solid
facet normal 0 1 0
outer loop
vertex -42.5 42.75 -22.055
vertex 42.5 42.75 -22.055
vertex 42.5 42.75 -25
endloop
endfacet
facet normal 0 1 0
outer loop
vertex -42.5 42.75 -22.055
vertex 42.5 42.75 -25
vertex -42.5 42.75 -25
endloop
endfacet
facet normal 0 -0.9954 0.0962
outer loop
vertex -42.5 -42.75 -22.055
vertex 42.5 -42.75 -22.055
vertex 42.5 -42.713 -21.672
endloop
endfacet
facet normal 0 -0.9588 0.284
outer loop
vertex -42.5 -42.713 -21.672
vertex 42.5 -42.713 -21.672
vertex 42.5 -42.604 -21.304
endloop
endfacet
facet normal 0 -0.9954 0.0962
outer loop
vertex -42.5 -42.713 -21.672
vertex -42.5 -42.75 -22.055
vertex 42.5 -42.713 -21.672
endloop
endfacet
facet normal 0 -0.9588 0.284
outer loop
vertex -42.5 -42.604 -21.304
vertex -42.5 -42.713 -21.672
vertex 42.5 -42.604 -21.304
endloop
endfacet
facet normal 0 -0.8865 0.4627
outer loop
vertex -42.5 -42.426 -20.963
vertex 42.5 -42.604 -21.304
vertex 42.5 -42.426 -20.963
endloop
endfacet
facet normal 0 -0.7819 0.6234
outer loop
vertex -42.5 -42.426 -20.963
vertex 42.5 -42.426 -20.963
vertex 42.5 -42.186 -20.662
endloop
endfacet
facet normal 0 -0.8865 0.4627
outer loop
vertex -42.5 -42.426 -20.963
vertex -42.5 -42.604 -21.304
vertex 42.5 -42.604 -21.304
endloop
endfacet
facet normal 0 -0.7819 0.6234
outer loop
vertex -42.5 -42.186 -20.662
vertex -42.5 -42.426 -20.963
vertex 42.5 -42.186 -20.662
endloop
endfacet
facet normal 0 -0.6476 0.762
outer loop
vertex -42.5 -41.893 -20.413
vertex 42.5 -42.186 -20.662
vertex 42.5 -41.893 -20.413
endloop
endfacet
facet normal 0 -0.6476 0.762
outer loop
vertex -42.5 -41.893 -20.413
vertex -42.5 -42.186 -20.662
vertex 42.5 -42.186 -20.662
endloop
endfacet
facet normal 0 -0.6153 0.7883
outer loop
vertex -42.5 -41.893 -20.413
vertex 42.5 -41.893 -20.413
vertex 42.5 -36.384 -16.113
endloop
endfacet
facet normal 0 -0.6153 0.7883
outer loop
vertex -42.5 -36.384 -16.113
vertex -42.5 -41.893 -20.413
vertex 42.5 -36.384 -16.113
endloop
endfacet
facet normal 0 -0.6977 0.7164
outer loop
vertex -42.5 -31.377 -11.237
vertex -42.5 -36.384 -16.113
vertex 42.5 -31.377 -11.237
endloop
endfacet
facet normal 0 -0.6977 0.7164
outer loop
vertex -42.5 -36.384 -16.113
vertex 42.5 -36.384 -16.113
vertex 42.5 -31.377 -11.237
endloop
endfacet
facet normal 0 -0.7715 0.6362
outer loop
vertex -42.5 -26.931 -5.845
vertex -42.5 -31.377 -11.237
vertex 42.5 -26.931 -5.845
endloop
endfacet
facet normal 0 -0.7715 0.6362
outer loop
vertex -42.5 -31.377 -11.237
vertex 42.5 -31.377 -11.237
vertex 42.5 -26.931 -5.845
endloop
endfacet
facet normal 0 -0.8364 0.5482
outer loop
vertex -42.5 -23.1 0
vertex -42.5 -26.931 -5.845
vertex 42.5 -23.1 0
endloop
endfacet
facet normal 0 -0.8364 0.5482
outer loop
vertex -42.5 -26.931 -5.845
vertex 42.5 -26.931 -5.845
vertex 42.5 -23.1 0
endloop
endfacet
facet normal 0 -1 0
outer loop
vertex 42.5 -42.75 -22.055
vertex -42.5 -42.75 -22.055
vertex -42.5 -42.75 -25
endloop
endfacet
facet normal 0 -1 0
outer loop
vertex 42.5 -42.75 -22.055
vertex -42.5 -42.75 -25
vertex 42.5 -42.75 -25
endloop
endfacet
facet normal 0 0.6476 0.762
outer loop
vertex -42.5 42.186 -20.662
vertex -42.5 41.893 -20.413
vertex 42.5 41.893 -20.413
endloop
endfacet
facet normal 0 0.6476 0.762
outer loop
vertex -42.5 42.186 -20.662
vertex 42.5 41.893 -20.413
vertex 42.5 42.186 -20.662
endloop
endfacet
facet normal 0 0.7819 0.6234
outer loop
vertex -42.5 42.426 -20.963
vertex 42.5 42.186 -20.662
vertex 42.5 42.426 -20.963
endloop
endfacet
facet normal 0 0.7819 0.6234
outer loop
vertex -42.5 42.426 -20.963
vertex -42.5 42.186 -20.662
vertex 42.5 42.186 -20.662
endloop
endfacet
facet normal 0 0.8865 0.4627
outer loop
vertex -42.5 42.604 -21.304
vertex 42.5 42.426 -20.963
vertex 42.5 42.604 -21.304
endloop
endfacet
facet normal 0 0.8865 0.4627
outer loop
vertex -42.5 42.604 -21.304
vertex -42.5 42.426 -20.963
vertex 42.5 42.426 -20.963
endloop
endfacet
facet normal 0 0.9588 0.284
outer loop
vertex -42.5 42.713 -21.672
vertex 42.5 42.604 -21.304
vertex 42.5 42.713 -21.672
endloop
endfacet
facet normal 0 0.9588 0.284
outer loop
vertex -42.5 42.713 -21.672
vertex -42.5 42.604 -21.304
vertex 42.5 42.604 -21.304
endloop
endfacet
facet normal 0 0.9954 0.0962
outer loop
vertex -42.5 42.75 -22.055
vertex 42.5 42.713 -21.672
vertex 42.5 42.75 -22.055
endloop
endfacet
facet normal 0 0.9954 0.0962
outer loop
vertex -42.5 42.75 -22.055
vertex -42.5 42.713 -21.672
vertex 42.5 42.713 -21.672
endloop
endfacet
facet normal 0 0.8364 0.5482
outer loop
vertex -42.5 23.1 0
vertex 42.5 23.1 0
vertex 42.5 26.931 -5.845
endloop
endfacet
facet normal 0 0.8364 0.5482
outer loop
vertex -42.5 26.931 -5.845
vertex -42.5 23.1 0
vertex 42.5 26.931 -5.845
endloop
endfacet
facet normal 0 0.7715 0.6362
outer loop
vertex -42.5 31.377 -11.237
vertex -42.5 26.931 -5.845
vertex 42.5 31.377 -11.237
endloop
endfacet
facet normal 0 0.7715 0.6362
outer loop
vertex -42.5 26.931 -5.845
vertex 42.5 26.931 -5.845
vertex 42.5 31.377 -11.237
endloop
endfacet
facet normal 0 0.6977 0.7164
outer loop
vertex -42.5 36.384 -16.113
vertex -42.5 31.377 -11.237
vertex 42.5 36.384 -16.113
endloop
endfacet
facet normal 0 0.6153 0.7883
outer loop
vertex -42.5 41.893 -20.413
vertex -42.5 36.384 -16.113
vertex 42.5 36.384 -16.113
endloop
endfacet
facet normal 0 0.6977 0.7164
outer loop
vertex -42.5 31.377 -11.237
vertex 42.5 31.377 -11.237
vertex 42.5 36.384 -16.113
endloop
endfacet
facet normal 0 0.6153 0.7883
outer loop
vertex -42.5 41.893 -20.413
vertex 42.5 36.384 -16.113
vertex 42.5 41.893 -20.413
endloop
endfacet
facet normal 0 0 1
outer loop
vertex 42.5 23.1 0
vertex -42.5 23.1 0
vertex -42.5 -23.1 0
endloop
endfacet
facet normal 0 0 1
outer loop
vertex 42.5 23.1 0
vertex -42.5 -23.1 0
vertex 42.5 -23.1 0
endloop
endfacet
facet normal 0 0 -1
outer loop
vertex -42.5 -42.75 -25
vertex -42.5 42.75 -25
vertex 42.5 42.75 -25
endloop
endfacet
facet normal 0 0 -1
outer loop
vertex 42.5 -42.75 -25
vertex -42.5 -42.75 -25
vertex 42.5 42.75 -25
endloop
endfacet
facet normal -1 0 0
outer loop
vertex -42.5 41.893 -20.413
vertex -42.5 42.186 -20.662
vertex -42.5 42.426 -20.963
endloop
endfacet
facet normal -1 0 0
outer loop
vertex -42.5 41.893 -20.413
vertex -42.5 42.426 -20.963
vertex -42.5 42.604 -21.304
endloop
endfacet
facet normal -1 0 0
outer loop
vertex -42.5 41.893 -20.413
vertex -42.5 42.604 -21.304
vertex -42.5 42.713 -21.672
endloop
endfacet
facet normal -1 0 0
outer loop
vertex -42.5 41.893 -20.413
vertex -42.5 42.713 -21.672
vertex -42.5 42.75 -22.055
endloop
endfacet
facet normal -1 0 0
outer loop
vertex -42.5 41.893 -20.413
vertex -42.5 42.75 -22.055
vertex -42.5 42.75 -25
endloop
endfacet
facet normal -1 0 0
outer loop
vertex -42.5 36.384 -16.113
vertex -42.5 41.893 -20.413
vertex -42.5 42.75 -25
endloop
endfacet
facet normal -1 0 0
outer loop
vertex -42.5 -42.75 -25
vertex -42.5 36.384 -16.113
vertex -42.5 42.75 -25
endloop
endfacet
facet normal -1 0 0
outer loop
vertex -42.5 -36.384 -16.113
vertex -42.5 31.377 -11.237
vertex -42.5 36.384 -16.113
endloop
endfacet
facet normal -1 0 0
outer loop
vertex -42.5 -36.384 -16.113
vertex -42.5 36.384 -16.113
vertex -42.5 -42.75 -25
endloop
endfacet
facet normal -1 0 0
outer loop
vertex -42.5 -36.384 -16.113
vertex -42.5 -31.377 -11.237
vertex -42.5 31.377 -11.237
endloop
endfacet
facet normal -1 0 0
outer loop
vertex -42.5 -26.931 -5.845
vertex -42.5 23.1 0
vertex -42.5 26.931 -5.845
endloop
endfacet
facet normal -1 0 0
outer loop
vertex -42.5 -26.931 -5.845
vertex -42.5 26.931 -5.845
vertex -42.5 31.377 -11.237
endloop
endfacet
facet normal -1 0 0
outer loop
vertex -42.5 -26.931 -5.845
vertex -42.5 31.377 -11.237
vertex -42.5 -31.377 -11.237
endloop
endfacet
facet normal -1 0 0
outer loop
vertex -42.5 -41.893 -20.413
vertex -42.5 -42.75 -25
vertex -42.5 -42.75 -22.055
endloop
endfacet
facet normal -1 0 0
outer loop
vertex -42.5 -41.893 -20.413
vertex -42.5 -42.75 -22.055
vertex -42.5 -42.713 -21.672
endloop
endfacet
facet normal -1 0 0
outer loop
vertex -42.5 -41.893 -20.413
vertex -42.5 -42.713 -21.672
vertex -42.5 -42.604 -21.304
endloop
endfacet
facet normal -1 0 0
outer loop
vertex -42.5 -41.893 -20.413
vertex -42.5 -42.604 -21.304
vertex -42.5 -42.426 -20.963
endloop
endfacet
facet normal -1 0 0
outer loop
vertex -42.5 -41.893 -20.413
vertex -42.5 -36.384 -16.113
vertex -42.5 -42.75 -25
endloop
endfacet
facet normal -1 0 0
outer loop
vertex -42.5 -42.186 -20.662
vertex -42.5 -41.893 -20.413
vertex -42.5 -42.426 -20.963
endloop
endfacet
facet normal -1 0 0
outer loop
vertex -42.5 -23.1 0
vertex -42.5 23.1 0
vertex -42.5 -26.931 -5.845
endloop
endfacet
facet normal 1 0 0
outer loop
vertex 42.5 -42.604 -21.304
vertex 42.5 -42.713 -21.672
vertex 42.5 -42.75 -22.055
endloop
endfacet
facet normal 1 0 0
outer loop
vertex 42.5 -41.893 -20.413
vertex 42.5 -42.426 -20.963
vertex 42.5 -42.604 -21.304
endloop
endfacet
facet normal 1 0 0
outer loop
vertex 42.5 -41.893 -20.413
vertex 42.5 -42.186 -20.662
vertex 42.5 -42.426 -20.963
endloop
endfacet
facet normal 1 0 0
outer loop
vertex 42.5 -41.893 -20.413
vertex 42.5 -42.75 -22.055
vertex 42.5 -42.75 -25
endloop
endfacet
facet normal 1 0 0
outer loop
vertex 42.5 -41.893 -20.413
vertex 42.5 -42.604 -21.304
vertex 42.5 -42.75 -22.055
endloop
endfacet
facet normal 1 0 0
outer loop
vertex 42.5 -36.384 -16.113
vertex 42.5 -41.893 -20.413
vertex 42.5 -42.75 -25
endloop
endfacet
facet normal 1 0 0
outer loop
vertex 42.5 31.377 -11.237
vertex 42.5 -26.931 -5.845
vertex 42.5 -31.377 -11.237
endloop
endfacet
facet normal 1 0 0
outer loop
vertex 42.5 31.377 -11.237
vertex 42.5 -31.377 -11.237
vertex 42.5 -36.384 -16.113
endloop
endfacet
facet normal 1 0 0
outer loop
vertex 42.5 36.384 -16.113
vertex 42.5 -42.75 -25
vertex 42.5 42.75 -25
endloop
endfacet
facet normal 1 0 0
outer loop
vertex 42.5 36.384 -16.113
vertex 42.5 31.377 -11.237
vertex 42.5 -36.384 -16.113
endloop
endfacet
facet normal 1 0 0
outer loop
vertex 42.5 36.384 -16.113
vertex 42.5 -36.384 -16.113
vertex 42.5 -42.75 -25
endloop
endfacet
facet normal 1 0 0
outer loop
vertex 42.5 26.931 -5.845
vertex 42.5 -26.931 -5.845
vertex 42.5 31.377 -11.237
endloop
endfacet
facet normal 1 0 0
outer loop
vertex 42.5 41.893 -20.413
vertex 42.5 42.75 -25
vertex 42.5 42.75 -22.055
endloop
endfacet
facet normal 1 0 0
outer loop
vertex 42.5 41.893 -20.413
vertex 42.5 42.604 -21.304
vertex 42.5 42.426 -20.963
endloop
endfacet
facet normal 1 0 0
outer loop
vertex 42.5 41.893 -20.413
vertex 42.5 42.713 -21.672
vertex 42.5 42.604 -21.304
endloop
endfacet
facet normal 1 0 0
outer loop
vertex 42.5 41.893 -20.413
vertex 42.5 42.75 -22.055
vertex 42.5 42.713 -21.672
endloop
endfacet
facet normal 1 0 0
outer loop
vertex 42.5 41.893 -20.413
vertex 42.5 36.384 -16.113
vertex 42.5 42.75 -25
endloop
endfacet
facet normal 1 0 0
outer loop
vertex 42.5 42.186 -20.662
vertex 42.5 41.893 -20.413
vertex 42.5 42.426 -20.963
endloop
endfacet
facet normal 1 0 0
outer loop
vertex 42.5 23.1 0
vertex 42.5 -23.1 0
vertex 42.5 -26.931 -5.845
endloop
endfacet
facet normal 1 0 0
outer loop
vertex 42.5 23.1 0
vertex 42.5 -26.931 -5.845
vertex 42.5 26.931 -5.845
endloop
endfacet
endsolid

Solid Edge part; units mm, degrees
sketch "Sketch1" plane through (0, 0, 0) normal (0, 0, 1) x (1, 0, 0)
  line L0 (-42.5, -42.75) -> (42.5, -42.75)
  line L1 (42.5, -42.75) -> (42.5, 42.75)
  line L2 (42.5, 42.75) -> (-42.5, 42.75)
  line L3 (-42.5, 42.75) -> (-42.5, -42.75)
extrude "Protrusion1" add sketch "Sketch1" against normal blind 25
sketch "Sketch2" plane through (42.5, 0, -12.5) normal (1, 0, 0) x (0, 1, 0)
  line L0 (-42.75, 12.5) -> (-23.1, 12.5)
  arc A0 (-23.1, 12.5) -> (-42.75, -8.5) centre (-78.4621, 44.6097) cw
  line L1 (-42.75, 12.5) -> (-42.75, -8.5)
extrude "ExtrudedCutout_2" cut sketch "Sketch2" against normal blind 85
fillet "Round_1" radius 2 1 edges at (0, -42.75, -21)
sketch "Sketch3" plane through (42.5, 0, -12.5) normal (1, 0, 0) x (0, 1, 0)
  line L0 (42.75, 12.5) -> (23.1, 12.5)
  arc A0 (23.1, 12.5) -> (42.75, -8.5) centre (78.4621, 44.6097) ccw
  line L1 (42.75, 12.5) -> (42.75, -8.5)
extrude "ExtrudedCutout_3" cut sketch "Sketch3" against normal blind 85
fillet "Round_2" radius 2 1 edges at (0, 42.75, -21)
